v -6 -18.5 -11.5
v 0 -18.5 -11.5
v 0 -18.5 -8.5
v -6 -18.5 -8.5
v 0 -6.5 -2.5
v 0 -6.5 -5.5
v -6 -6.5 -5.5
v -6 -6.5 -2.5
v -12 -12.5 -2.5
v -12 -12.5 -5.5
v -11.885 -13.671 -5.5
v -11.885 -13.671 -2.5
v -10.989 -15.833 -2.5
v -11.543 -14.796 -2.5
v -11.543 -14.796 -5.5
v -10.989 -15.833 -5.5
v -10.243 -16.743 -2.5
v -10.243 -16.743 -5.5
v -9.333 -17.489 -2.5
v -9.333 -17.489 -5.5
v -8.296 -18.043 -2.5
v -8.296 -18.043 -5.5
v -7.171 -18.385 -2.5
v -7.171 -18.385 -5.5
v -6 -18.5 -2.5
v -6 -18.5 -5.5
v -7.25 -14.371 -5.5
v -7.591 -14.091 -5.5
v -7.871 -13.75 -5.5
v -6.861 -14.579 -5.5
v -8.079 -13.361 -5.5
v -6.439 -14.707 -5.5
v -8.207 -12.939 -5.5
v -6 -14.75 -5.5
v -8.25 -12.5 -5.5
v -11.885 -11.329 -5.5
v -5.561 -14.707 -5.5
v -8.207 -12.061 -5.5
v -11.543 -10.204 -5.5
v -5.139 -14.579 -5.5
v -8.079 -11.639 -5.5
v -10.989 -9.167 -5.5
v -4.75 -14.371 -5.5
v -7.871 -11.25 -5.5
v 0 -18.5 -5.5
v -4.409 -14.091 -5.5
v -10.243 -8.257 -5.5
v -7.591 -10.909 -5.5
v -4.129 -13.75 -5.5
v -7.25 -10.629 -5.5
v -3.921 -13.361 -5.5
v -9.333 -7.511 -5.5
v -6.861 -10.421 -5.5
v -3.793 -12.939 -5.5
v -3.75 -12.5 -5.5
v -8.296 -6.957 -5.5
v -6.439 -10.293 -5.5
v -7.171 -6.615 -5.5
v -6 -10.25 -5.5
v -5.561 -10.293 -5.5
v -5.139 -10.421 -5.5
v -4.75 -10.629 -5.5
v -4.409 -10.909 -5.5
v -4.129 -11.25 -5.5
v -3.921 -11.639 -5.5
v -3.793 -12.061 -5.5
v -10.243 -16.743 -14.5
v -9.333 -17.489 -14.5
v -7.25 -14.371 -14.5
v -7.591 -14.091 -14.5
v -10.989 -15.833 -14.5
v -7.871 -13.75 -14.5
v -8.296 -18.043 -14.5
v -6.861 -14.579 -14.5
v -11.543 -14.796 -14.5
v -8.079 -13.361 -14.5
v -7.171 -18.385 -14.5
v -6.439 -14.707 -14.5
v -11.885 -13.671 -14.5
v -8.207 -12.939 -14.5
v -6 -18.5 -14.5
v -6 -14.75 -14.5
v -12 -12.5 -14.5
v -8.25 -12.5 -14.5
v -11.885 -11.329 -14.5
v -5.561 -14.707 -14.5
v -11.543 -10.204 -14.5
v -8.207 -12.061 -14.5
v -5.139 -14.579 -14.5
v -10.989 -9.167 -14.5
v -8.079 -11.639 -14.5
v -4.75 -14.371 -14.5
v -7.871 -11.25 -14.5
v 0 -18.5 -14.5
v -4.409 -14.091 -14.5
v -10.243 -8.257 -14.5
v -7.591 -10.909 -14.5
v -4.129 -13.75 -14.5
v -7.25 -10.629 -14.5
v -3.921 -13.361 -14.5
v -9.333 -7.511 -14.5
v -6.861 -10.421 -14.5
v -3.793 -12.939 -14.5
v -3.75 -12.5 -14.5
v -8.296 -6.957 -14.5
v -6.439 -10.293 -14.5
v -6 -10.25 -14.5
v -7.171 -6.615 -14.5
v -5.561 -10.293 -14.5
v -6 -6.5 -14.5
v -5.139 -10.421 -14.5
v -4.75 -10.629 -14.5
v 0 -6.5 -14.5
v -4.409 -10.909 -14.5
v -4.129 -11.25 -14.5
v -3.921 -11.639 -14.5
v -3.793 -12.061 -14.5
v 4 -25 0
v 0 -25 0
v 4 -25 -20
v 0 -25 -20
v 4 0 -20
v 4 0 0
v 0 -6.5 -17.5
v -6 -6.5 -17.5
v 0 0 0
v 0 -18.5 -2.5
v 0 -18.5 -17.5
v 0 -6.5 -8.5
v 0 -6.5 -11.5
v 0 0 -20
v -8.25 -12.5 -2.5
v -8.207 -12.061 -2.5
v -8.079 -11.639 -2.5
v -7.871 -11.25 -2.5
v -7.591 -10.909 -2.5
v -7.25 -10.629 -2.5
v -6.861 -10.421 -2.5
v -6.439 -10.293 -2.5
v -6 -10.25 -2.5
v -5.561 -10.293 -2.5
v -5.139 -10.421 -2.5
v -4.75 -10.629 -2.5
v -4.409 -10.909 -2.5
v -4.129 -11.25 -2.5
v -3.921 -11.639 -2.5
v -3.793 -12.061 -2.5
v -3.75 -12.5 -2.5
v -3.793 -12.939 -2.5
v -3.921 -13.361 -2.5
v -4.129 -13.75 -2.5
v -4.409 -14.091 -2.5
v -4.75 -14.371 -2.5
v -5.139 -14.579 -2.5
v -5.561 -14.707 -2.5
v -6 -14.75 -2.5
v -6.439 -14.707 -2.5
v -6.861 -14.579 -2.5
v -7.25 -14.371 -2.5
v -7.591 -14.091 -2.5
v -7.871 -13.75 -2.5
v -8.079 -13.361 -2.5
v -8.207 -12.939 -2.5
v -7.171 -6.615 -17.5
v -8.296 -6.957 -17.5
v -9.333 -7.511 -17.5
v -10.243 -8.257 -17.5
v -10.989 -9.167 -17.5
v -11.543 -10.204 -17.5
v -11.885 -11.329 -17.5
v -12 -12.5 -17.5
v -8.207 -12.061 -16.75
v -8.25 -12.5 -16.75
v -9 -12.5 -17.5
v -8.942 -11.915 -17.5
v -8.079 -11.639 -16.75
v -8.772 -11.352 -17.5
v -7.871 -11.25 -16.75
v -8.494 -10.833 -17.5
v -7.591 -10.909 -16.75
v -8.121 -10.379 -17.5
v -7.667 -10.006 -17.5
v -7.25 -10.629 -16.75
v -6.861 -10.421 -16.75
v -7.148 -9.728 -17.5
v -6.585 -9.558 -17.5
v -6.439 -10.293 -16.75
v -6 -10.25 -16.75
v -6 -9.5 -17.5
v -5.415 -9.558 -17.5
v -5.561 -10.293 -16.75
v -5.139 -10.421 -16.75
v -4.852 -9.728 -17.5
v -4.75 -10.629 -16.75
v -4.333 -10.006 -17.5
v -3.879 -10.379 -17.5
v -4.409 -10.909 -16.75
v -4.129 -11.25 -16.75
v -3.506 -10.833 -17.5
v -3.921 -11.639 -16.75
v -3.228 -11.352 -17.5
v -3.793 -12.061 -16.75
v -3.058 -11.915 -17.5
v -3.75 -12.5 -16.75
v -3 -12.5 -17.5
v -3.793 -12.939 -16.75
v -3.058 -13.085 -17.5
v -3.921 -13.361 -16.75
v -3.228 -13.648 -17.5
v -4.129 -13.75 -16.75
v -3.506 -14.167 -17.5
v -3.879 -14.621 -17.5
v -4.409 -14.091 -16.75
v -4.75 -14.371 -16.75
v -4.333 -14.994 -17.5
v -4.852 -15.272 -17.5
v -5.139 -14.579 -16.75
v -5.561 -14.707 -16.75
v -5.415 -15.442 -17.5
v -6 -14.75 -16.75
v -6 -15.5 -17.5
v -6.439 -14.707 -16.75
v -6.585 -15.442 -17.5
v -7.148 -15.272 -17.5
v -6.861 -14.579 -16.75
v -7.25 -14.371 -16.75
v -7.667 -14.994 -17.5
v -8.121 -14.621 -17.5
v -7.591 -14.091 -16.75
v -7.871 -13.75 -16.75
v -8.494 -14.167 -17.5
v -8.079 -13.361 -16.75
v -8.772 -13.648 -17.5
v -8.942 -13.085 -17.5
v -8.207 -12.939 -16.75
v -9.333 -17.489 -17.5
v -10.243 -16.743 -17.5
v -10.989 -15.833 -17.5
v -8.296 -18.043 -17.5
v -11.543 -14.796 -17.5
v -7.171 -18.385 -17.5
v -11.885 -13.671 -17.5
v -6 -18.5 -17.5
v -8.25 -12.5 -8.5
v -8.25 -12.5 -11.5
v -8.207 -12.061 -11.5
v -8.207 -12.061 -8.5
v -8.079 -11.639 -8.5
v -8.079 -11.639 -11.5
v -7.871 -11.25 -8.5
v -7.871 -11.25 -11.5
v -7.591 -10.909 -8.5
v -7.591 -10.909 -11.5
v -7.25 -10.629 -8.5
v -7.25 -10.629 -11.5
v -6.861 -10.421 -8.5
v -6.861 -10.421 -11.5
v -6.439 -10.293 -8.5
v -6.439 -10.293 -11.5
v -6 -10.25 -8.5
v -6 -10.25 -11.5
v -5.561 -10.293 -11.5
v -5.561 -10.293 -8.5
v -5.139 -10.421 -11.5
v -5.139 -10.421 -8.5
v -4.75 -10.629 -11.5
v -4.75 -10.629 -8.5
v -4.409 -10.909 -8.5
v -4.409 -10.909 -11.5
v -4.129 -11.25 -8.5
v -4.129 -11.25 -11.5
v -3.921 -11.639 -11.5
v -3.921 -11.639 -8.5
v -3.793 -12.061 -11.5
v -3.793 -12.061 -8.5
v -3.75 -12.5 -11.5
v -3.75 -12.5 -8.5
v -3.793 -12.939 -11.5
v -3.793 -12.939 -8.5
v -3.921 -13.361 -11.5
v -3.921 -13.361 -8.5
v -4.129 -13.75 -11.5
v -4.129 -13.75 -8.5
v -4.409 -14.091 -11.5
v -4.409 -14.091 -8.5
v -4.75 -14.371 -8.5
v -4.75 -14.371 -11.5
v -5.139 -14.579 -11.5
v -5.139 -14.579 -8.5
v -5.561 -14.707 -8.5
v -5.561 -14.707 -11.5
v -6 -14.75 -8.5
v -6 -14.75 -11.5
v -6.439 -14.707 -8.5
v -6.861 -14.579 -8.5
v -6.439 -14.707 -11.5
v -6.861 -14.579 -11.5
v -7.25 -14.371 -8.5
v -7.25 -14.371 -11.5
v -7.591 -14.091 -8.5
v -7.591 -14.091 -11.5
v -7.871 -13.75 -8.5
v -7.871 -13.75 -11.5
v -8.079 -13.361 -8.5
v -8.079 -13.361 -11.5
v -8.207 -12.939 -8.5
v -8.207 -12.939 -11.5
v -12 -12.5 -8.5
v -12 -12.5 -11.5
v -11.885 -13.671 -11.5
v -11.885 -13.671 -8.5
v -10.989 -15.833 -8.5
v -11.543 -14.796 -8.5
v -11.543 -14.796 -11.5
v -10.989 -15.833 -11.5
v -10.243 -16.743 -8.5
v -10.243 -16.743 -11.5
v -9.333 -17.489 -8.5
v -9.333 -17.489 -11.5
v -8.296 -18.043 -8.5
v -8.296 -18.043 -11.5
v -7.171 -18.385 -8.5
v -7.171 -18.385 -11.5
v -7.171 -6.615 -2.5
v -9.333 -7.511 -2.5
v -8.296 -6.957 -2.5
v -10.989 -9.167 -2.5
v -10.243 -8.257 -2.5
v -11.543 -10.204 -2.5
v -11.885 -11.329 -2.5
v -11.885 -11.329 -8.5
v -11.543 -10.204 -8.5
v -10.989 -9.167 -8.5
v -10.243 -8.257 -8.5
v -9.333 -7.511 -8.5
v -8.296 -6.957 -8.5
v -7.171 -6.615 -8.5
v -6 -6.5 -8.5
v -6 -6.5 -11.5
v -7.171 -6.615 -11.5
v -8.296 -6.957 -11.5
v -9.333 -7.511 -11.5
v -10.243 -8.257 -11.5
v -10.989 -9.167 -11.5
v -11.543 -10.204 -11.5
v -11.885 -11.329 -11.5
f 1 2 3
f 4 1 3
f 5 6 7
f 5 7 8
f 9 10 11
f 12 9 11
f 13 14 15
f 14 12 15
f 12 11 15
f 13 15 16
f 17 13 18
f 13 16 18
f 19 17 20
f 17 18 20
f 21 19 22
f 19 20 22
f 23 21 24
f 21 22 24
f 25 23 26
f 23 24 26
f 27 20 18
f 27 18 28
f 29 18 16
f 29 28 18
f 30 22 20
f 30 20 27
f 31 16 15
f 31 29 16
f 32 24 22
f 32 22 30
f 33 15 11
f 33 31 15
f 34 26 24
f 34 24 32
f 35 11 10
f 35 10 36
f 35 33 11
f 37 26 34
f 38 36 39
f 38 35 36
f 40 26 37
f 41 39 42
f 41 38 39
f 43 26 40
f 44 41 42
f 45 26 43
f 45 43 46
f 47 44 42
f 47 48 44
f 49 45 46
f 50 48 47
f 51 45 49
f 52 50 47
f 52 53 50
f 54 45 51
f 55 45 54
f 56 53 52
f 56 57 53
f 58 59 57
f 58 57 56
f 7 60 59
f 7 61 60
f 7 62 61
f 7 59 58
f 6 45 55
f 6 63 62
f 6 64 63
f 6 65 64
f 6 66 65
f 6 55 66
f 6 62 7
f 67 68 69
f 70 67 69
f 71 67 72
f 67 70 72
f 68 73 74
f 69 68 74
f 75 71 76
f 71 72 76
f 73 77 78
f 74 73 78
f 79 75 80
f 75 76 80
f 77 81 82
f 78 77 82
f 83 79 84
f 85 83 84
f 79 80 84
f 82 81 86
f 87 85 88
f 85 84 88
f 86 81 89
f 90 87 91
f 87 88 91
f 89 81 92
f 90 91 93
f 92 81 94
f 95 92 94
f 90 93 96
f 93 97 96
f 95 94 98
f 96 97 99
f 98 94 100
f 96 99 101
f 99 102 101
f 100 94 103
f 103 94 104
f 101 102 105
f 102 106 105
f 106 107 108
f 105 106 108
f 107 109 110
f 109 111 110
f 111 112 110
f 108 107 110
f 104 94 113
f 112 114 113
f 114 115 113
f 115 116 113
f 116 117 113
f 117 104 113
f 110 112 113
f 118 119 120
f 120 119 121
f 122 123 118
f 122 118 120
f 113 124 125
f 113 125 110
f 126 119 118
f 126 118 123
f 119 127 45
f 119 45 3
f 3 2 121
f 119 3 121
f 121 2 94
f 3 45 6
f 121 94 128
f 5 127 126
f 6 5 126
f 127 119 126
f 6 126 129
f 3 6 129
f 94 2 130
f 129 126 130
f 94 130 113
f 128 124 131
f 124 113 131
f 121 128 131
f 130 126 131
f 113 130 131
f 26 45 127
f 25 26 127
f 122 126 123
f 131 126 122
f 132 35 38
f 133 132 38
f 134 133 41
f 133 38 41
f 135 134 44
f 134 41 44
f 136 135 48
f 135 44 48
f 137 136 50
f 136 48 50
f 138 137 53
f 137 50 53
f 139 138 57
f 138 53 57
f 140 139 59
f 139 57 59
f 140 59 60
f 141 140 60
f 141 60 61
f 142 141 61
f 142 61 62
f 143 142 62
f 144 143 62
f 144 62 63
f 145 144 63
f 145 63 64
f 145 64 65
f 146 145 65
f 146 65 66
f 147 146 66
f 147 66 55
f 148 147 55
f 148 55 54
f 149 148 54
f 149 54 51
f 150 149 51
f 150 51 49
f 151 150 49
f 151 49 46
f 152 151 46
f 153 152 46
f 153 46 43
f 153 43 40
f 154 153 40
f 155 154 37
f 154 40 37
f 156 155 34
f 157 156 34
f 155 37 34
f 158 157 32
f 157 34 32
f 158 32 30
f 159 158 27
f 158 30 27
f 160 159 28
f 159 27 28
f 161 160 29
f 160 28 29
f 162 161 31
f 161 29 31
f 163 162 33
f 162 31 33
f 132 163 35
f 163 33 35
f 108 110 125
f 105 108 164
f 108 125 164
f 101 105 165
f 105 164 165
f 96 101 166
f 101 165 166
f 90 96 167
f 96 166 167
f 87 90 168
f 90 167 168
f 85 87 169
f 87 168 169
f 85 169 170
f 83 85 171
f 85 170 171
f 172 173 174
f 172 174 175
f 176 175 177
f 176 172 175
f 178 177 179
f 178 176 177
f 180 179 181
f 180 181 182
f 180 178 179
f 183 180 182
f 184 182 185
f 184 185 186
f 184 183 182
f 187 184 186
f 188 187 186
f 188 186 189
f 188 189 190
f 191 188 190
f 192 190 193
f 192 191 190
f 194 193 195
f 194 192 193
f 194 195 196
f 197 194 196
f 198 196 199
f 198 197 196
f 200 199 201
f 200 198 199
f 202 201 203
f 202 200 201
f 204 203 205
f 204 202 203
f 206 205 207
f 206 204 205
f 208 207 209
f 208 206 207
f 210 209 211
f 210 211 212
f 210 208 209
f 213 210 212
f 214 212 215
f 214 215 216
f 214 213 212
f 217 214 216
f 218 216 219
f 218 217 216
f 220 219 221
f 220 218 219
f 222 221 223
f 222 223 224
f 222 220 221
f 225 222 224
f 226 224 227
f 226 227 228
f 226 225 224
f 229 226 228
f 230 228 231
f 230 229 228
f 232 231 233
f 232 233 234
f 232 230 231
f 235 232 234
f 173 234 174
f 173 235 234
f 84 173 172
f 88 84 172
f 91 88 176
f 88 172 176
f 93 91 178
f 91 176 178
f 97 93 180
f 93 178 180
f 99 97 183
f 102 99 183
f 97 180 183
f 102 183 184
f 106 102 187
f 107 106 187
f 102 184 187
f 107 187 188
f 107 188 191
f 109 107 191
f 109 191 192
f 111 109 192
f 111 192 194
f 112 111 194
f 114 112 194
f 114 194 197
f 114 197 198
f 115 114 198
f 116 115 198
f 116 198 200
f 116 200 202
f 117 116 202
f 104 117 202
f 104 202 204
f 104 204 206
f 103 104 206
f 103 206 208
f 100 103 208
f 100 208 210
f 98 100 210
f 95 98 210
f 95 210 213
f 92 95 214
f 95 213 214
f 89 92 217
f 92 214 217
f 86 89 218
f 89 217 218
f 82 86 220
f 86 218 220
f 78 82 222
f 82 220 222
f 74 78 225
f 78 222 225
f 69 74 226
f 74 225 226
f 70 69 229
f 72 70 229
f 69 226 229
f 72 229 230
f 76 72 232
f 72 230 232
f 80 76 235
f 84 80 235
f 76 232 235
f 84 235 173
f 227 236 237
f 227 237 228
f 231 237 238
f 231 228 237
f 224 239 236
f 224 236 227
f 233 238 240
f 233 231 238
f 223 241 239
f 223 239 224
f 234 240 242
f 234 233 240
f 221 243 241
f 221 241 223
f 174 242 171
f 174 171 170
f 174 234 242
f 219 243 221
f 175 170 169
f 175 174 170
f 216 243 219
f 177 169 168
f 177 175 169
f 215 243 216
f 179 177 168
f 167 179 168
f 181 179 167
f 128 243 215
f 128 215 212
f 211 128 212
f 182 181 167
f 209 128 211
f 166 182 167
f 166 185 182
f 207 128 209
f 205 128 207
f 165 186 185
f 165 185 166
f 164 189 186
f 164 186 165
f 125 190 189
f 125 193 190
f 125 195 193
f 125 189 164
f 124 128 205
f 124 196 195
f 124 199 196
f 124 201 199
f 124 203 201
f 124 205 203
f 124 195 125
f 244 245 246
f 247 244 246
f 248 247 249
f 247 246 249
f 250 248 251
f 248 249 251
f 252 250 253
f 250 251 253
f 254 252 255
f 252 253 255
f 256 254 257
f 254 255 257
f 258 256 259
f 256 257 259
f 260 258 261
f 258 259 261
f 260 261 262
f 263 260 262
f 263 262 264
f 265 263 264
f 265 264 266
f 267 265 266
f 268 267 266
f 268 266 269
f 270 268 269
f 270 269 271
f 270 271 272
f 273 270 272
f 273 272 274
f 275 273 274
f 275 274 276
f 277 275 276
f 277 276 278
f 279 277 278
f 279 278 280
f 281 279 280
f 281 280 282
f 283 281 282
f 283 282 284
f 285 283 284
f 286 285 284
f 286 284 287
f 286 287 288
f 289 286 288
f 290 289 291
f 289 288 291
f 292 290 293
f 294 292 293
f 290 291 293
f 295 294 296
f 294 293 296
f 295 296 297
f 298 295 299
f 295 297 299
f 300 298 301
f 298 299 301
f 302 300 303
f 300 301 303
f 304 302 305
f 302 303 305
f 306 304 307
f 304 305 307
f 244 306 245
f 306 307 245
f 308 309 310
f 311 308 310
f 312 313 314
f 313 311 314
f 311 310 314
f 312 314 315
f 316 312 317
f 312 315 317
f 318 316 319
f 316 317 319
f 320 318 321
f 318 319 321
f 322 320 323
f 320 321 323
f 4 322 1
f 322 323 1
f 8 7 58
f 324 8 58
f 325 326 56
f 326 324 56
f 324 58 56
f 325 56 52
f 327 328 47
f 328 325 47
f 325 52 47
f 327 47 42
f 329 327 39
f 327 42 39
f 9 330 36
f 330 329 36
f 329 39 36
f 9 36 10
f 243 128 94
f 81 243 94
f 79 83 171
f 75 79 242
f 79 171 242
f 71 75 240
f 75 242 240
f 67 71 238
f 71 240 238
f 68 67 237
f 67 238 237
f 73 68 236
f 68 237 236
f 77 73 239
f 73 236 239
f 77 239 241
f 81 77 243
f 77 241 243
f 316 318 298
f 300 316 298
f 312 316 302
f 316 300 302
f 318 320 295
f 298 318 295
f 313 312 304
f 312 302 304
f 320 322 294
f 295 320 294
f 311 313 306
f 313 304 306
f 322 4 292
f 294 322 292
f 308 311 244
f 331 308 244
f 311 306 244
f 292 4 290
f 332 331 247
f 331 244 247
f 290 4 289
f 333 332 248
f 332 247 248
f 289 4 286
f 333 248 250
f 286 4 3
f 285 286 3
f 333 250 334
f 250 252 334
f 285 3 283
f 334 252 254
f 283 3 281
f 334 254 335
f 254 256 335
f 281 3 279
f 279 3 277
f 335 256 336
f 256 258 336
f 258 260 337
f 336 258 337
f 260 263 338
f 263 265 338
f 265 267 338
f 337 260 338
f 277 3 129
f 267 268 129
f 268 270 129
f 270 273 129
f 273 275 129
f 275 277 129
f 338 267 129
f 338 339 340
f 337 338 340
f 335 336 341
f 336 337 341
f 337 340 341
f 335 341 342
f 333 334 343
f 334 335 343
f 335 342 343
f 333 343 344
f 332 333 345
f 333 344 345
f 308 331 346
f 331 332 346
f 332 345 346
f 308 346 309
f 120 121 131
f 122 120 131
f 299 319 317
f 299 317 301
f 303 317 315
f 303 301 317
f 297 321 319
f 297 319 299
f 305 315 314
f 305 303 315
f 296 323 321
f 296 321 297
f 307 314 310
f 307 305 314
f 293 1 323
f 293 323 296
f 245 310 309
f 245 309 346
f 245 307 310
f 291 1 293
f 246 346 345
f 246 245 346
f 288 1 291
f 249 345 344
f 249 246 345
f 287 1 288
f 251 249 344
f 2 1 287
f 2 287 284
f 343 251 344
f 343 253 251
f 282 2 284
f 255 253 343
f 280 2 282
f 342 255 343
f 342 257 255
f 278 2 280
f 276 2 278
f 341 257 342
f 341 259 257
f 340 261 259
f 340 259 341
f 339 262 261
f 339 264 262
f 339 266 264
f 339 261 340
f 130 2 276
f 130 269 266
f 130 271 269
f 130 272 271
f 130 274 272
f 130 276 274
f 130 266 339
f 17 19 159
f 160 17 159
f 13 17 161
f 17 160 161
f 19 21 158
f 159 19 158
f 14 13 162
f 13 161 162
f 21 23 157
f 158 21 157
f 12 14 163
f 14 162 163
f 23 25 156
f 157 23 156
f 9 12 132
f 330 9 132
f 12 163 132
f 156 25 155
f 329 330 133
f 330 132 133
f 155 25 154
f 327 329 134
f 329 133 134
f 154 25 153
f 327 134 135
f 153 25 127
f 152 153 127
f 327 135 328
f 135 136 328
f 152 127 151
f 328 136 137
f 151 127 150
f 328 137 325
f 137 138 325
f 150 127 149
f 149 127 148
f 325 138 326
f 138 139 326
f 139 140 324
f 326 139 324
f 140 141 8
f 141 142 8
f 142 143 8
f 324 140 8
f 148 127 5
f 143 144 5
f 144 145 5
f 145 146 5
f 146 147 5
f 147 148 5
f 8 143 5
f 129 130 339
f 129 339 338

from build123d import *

# Parameters (mm, degrees)
SKETCH1_W           = 20
SKETCH1_H           = 25
BOSS_EXTRUDE1_DEPTH = 4
SKETCH2_W           = 3
SKETCH2_H           = 12
BOSS_EXTRUDE2_DEPTH = 12
SKETCH3_R           = 2.25
CUT_EXTRUDE1_DEPTH  = 18.5
CHAMFER1_SIZE       = 0.75


with BuildPart() as part:
    # Sketch1 → Boss-Extrude1 (new body)
    with BuildSketch(Plane(origin=(0, 0, 0), x_dir=(0, 0, -1), z_dir=(1, 0, 0))):
        with Locations((10, -12.5)):
            Rectangle(SKETCH1_W, SKETCH1_H)
    extrude(amount=BOSS_EXTRUDE1_DEPTH)

    # Sketch2 → Boss-Extrude2 (add)
    with BuildSketch(Plane.ZY):
        with Locations((-10, -12.5)):
            Rectangle(SKETCH2_W, SKETCH2_H)
        with Locations((-4, -12.5)):
            Rectangle(SKETCH2_W, SKETCH2_H)
        with Locations((-16, -12.5)):
            Rectangle(SKETCH2_W, SKETCH2_H)
    extrude(amount=BOSS_EXTRUDE2_DEPTH)

    # Sketch3 → Cut-Extrude1 (cut, through all)
    with BuildSketch(Plane(origin=(0, 0, -17.5), x_dir=(-1, 0, 0), z_dir=(0, 0, -1))):
        with Locations((6, -12.5)):
            Circle(SKETCH3_R)
        with BuildLine():
            Line((12, -6.5), (6, -6.5))
            ThreePointArc((6, -6.5), (10.242640687, -8.257359313), (12, -12.5))
            Line((12, -12.5), (12, -6.5))
        make_face()
        with BuildLine():
            Line((12, -18.5), (12, -12.5))
            ThreePointArc((12, -12.5), (10.242640687, -16.742640687), (6, -18.5))
            Line((6, -18.5), (12, -18.5))
        make_face()
    extrude(amount=-CUT_EXTRUDE1_DEPTH, mode=Mode.SUBTRACT)

    # Chamfer1
    chamfer1_edges = [part.edges().sort_by_distance(p)[0] for p in [
        (-3.75, -12.5, -17.5),
    ]]
    chamfer(chamfer1_edges, length=CHAMFER1_SIZE)


solid = part.part
